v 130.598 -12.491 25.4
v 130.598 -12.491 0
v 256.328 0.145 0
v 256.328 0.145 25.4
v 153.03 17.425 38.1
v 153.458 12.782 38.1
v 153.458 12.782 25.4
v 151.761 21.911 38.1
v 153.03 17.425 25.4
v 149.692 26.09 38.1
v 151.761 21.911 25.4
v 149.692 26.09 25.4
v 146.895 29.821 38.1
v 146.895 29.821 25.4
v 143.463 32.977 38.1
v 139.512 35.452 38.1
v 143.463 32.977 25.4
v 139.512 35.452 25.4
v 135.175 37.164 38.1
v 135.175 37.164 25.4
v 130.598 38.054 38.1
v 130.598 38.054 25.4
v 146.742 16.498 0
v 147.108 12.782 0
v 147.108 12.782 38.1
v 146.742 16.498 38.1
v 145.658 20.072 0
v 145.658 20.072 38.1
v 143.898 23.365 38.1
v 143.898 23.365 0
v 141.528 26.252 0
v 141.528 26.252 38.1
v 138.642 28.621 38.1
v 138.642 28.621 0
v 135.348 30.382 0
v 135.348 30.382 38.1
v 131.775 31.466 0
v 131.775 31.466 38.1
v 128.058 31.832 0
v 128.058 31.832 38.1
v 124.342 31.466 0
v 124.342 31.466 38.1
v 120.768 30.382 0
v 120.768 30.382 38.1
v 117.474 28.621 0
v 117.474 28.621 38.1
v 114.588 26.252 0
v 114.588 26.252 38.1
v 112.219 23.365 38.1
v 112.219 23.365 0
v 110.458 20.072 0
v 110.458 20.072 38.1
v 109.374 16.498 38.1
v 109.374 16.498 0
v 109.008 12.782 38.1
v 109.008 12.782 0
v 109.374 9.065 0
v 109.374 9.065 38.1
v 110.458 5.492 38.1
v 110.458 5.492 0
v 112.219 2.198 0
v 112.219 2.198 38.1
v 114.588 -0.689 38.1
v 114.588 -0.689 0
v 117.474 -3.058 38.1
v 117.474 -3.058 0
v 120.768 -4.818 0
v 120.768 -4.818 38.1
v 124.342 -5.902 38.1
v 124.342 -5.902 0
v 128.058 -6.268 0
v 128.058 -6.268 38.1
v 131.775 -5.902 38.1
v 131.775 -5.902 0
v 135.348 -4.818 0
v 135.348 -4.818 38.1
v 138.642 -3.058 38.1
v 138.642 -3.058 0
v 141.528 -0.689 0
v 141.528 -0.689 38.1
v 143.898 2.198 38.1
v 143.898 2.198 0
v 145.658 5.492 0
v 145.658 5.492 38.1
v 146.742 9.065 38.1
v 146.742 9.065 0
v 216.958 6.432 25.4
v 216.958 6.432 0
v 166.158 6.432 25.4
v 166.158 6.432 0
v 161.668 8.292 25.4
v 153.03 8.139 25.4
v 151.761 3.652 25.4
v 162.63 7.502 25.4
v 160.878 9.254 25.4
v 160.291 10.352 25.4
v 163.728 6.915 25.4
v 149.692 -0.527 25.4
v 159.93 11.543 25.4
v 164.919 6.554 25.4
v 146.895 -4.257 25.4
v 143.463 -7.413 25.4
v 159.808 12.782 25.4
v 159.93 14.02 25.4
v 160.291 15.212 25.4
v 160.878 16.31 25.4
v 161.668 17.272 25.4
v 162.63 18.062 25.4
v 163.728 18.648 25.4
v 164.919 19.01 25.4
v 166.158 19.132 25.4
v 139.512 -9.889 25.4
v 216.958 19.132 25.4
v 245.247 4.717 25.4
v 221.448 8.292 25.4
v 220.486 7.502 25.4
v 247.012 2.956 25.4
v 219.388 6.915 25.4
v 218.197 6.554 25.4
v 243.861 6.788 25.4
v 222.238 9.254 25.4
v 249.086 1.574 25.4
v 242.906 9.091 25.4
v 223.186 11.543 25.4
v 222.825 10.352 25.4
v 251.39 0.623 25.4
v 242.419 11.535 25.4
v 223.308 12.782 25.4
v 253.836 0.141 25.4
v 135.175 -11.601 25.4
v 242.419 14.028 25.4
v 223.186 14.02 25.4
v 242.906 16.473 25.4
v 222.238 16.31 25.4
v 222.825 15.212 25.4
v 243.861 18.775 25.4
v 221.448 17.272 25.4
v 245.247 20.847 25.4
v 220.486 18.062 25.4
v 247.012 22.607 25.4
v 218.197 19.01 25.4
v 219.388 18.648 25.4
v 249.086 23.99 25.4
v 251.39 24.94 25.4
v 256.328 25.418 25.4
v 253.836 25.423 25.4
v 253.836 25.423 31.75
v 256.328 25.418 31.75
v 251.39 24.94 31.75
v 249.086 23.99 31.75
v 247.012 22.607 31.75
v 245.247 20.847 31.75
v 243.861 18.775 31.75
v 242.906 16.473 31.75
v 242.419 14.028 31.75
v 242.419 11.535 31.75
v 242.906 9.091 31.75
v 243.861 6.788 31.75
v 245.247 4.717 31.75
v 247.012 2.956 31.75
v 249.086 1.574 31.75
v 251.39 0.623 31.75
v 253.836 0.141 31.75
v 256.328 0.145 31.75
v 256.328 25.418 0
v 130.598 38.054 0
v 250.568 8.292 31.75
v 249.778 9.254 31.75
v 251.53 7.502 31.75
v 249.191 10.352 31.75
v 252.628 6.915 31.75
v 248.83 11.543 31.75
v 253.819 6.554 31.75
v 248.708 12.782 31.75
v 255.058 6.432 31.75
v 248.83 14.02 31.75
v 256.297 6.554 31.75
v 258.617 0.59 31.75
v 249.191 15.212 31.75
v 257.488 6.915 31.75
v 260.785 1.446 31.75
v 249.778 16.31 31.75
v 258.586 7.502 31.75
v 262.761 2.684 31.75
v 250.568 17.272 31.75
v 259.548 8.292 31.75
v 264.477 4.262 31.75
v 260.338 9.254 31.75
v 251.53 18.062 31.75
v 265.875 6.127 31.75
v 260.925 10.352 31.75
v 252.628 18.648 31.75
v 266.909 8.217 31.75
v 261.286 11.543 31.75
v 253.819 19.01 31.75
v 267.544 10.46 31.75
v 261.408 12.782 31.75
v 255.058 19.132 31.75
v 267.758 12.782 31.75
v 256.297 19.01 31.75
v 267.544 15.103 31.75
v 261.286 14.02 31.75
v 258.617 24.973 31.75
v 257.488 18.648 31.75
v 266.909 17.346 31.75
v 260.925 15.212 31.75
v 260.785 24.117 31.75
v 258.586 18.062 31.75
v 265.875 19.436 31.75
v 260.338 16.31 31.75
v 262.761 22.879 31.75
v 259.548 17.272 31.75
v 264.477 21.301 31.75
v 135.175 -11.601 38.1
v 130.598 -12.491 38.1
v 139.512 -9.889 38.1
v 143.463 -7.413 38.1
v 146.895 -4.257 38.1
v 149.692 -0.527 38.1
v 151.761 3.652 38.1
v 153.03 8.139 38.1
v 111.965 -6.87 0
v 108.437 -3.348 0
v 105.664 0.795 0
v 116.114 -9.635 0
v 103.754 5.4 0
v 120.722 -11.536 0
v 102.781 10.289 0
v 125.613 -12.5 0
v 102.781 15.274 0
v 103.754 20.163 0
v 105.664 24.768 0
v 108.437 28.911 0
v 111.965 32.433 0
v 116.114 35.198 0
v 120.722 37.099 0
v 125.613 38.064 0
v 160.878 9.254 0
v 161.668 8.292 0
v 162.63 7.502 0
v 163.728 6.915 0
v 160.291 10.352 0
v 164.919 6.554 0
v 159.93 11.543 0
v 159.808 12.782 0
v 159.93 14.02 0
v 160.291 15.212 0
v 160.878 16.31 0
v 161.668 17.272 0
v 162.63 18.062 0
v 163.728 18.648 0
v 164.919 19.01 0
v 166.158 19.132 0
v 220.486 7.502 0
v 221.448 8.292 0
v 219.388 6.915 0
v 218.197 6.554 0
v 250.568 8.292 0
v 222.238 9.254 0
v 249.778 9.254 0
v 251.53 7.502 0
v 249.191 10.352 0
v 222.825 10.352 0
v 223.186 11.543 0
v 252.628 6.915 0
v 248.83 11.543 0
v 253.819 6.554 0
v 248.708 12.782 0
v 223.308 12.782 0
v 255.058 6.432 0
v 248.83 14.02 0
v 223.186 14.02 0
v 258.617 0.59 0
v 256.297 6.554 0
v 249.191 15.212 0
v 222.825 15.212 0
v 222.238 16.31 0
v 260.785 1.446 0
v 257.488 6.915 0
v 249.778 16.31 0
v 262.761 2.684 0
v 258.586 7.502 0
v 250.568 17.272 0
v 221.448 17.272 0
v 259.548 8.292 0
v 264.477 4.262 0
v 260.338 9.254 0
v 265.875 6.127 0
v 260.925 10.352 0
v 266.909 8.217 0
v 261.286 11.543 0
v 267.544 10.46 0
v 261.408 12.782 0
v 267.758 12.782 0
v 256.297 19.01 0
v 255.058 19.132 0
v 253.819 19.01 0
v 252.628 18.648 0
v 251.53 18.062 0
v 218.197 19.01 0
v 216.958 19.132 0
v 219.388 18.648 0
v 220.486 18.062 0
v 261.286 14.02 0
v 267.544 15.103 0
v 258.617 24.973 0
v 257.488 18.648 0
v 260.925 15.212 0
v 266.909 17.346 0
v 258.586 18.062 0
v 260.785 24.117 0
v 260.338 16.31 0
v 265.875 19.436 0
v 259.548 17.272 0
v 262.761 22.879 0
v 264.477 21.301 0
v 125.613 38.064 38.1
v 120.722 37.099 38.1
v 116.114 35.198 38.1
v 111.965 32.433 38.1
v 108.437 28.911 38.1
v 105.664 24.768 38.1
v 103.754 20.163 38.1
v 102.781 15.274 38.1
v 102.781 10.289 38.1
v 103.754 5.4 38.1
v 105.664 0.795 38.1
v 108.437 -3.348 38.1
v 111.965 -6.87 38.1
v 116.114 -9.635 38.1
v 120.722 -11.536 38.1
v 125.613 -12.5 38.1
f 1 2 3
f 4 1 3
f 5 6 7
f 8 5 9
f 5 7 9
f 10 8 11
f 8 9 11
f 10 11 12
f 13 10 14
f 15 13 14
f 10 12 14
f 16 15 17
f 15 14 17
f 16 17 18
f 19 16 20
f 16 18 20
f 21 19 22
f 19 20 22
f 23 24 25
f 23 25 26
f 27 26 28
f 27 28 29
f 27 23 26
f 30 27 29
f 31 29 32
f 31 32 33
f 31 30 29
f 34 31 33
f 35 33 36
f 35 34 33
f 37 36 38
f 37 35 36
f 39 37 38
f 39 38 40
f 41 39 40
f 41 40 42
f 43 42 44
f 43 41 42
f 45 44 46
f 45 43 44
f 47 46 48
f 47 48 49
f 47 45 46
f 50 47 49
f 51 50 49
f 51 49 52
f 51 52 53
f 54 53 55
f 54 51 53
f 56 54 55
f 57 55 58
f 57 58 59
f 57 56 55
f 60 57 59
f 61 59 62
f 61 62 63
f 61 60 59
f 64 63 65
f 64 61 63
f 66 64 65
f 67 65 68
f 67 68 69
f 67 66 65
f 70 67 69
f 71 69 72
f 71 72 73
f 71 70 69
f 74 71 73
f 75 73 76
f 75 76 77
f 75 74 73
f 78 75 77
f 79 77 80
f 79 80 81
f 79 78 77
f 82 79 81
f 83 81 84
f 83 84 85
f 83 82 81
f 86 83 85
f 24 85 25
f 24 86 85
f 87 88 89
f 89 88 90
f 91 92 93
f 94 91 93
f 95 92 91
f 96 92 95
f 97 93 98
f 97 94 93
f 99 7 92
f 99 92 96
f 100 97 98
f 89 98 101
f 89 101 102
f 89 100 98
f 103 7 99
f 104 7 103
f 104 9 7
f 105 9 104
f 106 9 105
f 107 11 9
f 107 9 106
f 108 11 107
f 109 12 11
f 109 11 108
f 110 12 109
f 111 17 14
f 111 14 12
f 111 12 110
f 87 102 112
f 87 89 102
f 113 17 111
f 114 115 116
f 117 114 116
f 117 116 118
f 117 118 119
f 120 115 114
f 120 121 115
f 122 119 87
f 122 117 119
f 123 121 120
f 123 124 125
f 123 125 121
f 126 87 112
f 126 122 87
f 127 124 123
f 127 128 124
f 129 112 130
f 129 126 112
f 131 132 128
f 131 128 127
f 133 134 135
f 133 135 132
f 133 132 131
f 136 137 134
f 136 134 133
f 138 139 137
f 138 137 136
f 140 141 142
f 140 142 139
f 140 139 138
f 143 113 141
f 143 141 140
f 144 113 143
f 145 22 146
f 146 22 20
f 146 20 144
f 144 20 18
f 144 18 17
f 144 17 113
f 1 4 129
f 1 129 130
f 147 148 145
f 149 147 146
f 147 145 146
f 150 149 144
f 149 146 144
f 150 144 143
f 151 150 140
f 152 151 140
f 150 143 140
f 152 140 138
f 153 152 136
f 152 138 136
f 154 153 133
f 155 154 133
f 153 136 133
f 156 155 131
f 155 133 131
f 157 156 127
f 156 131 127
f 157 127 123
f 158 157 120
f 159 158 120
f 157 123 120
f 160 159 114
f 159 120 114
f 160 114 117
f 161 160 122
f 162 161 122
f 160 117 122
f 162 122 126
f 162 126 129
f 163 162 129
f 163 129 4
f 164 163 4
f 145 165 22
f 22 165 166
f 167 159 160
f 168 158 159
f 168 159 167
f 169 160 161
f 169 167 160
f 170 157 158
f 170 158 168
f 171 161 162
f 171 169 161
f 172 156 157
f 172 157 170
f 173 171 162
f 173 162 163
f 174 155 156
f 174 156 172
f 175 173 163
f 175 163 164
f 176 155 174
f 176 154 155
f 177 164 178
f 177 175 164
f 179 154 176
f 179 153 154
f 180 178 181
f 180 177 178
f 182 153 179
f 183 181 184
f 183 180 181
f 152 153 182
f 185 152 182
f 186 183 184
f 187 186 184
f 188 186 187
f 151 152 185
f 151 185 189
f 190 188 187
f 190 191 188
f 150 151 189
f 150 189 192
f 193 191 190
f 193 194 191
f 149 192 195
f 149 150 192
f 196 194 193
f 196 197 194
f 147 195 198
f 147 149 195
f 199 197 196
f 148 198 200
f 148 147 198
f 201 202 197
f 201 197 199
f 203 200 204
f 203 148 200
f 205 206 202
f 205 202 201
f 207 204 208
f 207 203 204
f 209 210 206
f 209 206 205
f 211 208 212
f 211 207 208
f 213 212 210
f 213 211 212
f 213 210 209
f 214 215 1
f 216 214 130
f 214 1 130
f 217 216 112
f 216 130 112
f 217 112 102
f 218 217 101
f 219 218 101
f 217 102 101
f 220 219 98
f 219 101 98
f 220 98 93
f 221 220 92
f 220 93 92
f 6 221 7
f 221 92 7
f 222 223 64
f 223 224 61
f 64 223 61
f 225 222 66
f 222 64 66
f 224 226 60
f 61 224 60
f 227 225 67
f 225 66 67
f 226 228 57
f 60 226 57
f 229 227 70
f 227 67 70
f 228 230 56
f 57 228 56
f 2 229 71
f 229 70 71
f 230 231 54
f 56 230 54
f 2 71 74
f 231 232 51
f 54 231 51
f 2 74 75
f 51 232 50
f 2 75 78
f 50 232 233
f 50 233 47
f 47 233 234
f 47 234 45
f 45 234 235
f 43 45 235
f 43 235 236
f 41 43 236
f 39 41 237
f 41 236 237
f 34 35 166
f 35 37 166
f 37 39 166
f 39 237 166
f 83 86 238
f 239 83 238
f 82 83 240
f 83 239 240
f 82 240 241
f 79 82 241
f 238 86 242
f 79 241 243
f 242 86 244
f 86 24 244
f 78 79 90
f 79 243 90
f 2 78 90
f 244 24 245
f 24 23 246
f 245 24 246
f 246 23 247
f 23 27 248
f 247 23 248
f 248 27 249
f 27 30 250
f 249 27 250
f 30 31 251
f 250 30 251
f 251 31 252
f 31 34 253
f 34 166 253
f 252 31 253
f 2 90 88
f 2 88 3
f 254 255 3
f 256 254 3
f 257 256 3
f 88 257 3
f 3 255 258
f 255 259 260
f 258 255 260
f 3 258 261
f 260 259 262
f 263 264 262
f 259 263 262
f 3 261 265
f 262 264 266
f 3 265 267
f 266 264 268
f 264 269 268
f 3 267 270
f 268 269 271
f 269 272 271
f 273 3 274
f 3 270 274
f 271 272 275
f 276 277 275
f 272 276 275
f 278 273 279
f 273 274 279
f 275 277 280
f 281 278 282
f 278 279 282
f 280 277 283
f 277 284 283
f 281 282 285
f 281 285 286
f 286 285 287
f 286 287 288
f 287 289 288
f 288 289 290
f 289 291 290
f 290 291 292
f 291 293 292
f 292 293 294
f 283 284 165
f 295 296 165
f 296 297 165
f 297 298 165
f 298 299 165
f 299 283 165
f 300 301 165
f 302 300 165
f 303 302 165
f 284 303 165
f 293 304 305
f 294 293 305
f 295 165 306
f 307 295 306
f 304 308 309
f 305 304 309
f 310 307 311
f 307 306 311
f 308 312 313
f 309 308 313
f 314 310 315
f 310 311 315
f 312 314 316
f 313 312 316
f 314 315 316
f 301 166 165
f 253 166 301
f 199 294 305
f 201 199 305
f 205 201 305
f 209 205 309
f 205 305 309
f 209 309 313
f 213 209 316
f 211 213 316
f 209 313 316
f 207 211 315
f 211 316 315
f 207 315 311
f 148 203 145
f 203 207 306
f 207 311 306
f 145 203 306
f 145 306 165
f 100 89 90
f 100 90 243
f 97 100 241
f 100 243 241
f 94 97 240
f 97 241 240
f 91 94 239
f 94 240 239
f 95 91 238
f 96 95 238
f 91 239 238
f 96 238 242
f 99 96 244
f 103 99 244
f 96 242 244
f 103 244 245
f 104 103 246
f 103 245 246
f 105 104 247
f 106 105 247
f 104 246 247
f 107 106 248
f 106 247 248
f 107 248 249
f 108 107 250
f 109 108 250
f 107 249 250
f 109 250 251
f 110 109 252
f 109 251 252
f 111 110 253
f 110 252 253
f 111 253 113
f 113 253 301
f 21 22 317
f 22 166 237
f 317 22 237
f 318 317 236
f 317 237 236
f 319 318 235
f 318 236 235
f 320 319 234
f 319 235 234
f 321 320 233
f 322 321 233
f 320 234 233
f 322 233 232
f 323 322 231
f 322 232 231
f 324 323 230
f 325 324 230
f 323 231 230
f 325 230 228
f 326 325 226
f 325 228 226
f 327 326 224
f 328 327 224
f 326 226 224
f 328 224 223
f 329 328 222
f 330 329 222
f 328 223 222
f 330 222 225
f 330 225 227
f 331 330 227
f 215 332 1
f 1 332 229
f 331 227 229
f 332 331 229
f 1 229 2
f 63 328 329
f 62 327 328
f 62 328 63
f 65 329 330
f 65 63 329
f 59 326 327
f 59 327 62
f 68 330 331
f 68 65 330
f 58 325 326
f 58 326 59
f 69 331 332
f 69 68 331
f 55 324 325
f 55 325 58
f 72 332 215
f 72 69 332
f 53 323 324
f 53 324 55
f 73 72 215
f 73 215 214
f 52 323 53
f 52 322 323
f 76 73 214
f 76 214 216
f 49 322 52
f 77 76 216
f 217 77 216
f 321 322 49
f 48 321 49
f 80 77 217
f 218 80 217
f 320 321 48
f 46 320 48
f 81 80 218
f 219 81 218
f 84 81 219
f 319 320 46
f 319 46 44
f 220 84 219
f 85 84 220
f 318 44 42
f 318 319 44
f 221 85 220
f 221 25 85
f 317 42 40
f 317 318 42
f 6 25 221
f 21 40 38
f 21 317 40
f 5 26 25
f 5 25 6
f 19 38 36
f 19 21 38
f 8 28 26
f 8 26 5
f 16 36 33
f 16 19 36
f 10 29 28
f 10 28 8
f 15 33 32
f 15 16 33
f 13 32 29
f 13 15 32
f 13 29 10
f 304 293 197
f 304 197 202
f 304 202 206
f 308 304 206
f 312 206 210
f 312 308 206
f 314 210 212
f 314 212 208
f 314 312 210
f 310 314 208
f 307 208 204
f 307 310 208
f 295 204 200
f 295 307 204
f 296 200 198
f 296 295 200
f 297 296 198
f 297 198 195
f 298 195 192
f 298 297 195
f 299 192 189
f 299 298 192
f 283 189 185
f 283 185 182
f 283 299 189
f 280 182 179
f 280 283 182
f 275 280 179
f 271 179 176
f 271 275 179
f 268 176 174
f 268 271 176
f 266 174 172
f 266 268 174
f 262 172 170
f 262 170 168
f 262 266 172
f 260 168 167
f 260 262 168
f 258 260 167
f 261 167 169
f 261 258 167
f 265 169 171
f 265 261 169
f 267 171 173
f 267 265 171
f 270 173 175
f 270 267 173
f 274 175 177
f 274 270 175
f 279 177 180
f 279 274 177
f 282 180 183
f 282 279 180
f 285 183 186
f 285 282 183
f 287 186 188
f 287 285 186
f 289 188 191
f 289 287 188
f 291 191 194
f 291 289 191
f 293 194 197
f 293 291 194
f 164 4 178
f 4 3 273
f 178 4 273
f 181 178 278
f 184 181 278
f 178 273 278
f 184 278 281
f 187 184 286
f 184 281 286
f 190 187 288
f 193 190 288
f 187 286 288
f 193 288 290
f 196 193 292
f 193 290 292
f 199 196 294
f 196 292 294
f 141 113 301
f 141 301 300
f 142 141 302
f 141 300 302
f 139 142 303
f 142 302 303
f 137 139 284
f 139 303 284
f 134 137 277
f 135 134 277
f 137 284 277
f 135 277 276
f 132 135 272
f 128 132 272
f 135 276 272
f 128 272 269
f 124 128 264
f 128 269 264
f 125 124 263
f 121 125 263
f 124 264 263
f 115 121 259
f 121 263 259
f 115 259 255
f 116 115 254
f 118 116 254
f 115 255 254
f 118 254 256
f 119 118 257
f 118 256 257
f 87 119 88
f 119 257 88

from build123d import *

# Parameters (mm, degrees)
F1_DEPTH = 25.4
F0_R     = 19.05
F2_DEPTH = 38.1
F0_R_2   = 6.35
F3_DEPTH = 31.75


with BuildPart() as f1:
    # F0 (on Top) → F1 (new body)
    with BuildSketch(Plane.XY):
        with BuildLine():
            ThreePointArc((256.328097, 0.145331), (242.358097, 12.781672), (256.328097, 25.418012))
            Line((256.328097, 25.418012), (130.598097, 38.054353))
            ThreePointArc((130.598097, 38.054353), (146.895241, 29.82051), (153.458097, 12.781672))
            ThreePointArc((153.458097, 12.781672), (146.895241, -4.257166), (130.598097, -12.491009))
            Line((130.598097, -12.491009), (256.328097, 0.145331))
        make_face()
        with BuildLine():
            ThreePointArc((166.158097, 6.431672), (159.808097, 12.781672), (166.158097, 19.131672))
            Line((166.158097, 19.131672), (216.958097, 19.131672))
            ThreePointArc((216.958097, 19.131672), (223.308097, 12.781672), (216.958097, 6.431672))
            Line((216.958097, 6.431672), (166.158097, 6.431672))
        make_face(mode=Mode.SUBTRACT)
    extrude(amount=F1_DEPTH)

    # F0 (on Top) → F2 (join)
    with BuildSketch(Plane.XY):
        with BuildLine():
            ThreePointArc((153.458097, 12.781672), (146.895241, 29.82051), (130.598097, 38.054353))
            ThreePointArc((130.598097, 38.054353), (102.658097, 12.781672), (130.598097, -12.491009))
            ThreePointArc((130.598097, -12.491009), (146.895241, -4.257166), (153.458097, 12.781672))
        make_face()
        with Locations((128.058097, 12.781672)):
            Circle(F0_R, mode=Mode.SUBTRACT)
    extrude(amount=F2_DEPTH)

    # F0 (on Top) → F3 (join)
    with BuildSketch(Plane.XY):
        with BuildLine():
            ThreePointArc((256.328097, 0.145331), (264.476669, 4.262253), (267.758097, 12.781672))
            ThreePointArc((267.758097, 12.781672), (264.476669, 21.301091), (256.328097, 25.418012))
            ThreePointArc((256.328097, 25.418012), (242.358097, 12.781672), (256.328097, 0.145331))
        make_face()
        with Locations((255.058097, 12.781672)):
            Circle(F0_R_2, mode=Mode.SUBTRACT)
    extrude(amount=F3_DEPTH)


solid = f1.part
